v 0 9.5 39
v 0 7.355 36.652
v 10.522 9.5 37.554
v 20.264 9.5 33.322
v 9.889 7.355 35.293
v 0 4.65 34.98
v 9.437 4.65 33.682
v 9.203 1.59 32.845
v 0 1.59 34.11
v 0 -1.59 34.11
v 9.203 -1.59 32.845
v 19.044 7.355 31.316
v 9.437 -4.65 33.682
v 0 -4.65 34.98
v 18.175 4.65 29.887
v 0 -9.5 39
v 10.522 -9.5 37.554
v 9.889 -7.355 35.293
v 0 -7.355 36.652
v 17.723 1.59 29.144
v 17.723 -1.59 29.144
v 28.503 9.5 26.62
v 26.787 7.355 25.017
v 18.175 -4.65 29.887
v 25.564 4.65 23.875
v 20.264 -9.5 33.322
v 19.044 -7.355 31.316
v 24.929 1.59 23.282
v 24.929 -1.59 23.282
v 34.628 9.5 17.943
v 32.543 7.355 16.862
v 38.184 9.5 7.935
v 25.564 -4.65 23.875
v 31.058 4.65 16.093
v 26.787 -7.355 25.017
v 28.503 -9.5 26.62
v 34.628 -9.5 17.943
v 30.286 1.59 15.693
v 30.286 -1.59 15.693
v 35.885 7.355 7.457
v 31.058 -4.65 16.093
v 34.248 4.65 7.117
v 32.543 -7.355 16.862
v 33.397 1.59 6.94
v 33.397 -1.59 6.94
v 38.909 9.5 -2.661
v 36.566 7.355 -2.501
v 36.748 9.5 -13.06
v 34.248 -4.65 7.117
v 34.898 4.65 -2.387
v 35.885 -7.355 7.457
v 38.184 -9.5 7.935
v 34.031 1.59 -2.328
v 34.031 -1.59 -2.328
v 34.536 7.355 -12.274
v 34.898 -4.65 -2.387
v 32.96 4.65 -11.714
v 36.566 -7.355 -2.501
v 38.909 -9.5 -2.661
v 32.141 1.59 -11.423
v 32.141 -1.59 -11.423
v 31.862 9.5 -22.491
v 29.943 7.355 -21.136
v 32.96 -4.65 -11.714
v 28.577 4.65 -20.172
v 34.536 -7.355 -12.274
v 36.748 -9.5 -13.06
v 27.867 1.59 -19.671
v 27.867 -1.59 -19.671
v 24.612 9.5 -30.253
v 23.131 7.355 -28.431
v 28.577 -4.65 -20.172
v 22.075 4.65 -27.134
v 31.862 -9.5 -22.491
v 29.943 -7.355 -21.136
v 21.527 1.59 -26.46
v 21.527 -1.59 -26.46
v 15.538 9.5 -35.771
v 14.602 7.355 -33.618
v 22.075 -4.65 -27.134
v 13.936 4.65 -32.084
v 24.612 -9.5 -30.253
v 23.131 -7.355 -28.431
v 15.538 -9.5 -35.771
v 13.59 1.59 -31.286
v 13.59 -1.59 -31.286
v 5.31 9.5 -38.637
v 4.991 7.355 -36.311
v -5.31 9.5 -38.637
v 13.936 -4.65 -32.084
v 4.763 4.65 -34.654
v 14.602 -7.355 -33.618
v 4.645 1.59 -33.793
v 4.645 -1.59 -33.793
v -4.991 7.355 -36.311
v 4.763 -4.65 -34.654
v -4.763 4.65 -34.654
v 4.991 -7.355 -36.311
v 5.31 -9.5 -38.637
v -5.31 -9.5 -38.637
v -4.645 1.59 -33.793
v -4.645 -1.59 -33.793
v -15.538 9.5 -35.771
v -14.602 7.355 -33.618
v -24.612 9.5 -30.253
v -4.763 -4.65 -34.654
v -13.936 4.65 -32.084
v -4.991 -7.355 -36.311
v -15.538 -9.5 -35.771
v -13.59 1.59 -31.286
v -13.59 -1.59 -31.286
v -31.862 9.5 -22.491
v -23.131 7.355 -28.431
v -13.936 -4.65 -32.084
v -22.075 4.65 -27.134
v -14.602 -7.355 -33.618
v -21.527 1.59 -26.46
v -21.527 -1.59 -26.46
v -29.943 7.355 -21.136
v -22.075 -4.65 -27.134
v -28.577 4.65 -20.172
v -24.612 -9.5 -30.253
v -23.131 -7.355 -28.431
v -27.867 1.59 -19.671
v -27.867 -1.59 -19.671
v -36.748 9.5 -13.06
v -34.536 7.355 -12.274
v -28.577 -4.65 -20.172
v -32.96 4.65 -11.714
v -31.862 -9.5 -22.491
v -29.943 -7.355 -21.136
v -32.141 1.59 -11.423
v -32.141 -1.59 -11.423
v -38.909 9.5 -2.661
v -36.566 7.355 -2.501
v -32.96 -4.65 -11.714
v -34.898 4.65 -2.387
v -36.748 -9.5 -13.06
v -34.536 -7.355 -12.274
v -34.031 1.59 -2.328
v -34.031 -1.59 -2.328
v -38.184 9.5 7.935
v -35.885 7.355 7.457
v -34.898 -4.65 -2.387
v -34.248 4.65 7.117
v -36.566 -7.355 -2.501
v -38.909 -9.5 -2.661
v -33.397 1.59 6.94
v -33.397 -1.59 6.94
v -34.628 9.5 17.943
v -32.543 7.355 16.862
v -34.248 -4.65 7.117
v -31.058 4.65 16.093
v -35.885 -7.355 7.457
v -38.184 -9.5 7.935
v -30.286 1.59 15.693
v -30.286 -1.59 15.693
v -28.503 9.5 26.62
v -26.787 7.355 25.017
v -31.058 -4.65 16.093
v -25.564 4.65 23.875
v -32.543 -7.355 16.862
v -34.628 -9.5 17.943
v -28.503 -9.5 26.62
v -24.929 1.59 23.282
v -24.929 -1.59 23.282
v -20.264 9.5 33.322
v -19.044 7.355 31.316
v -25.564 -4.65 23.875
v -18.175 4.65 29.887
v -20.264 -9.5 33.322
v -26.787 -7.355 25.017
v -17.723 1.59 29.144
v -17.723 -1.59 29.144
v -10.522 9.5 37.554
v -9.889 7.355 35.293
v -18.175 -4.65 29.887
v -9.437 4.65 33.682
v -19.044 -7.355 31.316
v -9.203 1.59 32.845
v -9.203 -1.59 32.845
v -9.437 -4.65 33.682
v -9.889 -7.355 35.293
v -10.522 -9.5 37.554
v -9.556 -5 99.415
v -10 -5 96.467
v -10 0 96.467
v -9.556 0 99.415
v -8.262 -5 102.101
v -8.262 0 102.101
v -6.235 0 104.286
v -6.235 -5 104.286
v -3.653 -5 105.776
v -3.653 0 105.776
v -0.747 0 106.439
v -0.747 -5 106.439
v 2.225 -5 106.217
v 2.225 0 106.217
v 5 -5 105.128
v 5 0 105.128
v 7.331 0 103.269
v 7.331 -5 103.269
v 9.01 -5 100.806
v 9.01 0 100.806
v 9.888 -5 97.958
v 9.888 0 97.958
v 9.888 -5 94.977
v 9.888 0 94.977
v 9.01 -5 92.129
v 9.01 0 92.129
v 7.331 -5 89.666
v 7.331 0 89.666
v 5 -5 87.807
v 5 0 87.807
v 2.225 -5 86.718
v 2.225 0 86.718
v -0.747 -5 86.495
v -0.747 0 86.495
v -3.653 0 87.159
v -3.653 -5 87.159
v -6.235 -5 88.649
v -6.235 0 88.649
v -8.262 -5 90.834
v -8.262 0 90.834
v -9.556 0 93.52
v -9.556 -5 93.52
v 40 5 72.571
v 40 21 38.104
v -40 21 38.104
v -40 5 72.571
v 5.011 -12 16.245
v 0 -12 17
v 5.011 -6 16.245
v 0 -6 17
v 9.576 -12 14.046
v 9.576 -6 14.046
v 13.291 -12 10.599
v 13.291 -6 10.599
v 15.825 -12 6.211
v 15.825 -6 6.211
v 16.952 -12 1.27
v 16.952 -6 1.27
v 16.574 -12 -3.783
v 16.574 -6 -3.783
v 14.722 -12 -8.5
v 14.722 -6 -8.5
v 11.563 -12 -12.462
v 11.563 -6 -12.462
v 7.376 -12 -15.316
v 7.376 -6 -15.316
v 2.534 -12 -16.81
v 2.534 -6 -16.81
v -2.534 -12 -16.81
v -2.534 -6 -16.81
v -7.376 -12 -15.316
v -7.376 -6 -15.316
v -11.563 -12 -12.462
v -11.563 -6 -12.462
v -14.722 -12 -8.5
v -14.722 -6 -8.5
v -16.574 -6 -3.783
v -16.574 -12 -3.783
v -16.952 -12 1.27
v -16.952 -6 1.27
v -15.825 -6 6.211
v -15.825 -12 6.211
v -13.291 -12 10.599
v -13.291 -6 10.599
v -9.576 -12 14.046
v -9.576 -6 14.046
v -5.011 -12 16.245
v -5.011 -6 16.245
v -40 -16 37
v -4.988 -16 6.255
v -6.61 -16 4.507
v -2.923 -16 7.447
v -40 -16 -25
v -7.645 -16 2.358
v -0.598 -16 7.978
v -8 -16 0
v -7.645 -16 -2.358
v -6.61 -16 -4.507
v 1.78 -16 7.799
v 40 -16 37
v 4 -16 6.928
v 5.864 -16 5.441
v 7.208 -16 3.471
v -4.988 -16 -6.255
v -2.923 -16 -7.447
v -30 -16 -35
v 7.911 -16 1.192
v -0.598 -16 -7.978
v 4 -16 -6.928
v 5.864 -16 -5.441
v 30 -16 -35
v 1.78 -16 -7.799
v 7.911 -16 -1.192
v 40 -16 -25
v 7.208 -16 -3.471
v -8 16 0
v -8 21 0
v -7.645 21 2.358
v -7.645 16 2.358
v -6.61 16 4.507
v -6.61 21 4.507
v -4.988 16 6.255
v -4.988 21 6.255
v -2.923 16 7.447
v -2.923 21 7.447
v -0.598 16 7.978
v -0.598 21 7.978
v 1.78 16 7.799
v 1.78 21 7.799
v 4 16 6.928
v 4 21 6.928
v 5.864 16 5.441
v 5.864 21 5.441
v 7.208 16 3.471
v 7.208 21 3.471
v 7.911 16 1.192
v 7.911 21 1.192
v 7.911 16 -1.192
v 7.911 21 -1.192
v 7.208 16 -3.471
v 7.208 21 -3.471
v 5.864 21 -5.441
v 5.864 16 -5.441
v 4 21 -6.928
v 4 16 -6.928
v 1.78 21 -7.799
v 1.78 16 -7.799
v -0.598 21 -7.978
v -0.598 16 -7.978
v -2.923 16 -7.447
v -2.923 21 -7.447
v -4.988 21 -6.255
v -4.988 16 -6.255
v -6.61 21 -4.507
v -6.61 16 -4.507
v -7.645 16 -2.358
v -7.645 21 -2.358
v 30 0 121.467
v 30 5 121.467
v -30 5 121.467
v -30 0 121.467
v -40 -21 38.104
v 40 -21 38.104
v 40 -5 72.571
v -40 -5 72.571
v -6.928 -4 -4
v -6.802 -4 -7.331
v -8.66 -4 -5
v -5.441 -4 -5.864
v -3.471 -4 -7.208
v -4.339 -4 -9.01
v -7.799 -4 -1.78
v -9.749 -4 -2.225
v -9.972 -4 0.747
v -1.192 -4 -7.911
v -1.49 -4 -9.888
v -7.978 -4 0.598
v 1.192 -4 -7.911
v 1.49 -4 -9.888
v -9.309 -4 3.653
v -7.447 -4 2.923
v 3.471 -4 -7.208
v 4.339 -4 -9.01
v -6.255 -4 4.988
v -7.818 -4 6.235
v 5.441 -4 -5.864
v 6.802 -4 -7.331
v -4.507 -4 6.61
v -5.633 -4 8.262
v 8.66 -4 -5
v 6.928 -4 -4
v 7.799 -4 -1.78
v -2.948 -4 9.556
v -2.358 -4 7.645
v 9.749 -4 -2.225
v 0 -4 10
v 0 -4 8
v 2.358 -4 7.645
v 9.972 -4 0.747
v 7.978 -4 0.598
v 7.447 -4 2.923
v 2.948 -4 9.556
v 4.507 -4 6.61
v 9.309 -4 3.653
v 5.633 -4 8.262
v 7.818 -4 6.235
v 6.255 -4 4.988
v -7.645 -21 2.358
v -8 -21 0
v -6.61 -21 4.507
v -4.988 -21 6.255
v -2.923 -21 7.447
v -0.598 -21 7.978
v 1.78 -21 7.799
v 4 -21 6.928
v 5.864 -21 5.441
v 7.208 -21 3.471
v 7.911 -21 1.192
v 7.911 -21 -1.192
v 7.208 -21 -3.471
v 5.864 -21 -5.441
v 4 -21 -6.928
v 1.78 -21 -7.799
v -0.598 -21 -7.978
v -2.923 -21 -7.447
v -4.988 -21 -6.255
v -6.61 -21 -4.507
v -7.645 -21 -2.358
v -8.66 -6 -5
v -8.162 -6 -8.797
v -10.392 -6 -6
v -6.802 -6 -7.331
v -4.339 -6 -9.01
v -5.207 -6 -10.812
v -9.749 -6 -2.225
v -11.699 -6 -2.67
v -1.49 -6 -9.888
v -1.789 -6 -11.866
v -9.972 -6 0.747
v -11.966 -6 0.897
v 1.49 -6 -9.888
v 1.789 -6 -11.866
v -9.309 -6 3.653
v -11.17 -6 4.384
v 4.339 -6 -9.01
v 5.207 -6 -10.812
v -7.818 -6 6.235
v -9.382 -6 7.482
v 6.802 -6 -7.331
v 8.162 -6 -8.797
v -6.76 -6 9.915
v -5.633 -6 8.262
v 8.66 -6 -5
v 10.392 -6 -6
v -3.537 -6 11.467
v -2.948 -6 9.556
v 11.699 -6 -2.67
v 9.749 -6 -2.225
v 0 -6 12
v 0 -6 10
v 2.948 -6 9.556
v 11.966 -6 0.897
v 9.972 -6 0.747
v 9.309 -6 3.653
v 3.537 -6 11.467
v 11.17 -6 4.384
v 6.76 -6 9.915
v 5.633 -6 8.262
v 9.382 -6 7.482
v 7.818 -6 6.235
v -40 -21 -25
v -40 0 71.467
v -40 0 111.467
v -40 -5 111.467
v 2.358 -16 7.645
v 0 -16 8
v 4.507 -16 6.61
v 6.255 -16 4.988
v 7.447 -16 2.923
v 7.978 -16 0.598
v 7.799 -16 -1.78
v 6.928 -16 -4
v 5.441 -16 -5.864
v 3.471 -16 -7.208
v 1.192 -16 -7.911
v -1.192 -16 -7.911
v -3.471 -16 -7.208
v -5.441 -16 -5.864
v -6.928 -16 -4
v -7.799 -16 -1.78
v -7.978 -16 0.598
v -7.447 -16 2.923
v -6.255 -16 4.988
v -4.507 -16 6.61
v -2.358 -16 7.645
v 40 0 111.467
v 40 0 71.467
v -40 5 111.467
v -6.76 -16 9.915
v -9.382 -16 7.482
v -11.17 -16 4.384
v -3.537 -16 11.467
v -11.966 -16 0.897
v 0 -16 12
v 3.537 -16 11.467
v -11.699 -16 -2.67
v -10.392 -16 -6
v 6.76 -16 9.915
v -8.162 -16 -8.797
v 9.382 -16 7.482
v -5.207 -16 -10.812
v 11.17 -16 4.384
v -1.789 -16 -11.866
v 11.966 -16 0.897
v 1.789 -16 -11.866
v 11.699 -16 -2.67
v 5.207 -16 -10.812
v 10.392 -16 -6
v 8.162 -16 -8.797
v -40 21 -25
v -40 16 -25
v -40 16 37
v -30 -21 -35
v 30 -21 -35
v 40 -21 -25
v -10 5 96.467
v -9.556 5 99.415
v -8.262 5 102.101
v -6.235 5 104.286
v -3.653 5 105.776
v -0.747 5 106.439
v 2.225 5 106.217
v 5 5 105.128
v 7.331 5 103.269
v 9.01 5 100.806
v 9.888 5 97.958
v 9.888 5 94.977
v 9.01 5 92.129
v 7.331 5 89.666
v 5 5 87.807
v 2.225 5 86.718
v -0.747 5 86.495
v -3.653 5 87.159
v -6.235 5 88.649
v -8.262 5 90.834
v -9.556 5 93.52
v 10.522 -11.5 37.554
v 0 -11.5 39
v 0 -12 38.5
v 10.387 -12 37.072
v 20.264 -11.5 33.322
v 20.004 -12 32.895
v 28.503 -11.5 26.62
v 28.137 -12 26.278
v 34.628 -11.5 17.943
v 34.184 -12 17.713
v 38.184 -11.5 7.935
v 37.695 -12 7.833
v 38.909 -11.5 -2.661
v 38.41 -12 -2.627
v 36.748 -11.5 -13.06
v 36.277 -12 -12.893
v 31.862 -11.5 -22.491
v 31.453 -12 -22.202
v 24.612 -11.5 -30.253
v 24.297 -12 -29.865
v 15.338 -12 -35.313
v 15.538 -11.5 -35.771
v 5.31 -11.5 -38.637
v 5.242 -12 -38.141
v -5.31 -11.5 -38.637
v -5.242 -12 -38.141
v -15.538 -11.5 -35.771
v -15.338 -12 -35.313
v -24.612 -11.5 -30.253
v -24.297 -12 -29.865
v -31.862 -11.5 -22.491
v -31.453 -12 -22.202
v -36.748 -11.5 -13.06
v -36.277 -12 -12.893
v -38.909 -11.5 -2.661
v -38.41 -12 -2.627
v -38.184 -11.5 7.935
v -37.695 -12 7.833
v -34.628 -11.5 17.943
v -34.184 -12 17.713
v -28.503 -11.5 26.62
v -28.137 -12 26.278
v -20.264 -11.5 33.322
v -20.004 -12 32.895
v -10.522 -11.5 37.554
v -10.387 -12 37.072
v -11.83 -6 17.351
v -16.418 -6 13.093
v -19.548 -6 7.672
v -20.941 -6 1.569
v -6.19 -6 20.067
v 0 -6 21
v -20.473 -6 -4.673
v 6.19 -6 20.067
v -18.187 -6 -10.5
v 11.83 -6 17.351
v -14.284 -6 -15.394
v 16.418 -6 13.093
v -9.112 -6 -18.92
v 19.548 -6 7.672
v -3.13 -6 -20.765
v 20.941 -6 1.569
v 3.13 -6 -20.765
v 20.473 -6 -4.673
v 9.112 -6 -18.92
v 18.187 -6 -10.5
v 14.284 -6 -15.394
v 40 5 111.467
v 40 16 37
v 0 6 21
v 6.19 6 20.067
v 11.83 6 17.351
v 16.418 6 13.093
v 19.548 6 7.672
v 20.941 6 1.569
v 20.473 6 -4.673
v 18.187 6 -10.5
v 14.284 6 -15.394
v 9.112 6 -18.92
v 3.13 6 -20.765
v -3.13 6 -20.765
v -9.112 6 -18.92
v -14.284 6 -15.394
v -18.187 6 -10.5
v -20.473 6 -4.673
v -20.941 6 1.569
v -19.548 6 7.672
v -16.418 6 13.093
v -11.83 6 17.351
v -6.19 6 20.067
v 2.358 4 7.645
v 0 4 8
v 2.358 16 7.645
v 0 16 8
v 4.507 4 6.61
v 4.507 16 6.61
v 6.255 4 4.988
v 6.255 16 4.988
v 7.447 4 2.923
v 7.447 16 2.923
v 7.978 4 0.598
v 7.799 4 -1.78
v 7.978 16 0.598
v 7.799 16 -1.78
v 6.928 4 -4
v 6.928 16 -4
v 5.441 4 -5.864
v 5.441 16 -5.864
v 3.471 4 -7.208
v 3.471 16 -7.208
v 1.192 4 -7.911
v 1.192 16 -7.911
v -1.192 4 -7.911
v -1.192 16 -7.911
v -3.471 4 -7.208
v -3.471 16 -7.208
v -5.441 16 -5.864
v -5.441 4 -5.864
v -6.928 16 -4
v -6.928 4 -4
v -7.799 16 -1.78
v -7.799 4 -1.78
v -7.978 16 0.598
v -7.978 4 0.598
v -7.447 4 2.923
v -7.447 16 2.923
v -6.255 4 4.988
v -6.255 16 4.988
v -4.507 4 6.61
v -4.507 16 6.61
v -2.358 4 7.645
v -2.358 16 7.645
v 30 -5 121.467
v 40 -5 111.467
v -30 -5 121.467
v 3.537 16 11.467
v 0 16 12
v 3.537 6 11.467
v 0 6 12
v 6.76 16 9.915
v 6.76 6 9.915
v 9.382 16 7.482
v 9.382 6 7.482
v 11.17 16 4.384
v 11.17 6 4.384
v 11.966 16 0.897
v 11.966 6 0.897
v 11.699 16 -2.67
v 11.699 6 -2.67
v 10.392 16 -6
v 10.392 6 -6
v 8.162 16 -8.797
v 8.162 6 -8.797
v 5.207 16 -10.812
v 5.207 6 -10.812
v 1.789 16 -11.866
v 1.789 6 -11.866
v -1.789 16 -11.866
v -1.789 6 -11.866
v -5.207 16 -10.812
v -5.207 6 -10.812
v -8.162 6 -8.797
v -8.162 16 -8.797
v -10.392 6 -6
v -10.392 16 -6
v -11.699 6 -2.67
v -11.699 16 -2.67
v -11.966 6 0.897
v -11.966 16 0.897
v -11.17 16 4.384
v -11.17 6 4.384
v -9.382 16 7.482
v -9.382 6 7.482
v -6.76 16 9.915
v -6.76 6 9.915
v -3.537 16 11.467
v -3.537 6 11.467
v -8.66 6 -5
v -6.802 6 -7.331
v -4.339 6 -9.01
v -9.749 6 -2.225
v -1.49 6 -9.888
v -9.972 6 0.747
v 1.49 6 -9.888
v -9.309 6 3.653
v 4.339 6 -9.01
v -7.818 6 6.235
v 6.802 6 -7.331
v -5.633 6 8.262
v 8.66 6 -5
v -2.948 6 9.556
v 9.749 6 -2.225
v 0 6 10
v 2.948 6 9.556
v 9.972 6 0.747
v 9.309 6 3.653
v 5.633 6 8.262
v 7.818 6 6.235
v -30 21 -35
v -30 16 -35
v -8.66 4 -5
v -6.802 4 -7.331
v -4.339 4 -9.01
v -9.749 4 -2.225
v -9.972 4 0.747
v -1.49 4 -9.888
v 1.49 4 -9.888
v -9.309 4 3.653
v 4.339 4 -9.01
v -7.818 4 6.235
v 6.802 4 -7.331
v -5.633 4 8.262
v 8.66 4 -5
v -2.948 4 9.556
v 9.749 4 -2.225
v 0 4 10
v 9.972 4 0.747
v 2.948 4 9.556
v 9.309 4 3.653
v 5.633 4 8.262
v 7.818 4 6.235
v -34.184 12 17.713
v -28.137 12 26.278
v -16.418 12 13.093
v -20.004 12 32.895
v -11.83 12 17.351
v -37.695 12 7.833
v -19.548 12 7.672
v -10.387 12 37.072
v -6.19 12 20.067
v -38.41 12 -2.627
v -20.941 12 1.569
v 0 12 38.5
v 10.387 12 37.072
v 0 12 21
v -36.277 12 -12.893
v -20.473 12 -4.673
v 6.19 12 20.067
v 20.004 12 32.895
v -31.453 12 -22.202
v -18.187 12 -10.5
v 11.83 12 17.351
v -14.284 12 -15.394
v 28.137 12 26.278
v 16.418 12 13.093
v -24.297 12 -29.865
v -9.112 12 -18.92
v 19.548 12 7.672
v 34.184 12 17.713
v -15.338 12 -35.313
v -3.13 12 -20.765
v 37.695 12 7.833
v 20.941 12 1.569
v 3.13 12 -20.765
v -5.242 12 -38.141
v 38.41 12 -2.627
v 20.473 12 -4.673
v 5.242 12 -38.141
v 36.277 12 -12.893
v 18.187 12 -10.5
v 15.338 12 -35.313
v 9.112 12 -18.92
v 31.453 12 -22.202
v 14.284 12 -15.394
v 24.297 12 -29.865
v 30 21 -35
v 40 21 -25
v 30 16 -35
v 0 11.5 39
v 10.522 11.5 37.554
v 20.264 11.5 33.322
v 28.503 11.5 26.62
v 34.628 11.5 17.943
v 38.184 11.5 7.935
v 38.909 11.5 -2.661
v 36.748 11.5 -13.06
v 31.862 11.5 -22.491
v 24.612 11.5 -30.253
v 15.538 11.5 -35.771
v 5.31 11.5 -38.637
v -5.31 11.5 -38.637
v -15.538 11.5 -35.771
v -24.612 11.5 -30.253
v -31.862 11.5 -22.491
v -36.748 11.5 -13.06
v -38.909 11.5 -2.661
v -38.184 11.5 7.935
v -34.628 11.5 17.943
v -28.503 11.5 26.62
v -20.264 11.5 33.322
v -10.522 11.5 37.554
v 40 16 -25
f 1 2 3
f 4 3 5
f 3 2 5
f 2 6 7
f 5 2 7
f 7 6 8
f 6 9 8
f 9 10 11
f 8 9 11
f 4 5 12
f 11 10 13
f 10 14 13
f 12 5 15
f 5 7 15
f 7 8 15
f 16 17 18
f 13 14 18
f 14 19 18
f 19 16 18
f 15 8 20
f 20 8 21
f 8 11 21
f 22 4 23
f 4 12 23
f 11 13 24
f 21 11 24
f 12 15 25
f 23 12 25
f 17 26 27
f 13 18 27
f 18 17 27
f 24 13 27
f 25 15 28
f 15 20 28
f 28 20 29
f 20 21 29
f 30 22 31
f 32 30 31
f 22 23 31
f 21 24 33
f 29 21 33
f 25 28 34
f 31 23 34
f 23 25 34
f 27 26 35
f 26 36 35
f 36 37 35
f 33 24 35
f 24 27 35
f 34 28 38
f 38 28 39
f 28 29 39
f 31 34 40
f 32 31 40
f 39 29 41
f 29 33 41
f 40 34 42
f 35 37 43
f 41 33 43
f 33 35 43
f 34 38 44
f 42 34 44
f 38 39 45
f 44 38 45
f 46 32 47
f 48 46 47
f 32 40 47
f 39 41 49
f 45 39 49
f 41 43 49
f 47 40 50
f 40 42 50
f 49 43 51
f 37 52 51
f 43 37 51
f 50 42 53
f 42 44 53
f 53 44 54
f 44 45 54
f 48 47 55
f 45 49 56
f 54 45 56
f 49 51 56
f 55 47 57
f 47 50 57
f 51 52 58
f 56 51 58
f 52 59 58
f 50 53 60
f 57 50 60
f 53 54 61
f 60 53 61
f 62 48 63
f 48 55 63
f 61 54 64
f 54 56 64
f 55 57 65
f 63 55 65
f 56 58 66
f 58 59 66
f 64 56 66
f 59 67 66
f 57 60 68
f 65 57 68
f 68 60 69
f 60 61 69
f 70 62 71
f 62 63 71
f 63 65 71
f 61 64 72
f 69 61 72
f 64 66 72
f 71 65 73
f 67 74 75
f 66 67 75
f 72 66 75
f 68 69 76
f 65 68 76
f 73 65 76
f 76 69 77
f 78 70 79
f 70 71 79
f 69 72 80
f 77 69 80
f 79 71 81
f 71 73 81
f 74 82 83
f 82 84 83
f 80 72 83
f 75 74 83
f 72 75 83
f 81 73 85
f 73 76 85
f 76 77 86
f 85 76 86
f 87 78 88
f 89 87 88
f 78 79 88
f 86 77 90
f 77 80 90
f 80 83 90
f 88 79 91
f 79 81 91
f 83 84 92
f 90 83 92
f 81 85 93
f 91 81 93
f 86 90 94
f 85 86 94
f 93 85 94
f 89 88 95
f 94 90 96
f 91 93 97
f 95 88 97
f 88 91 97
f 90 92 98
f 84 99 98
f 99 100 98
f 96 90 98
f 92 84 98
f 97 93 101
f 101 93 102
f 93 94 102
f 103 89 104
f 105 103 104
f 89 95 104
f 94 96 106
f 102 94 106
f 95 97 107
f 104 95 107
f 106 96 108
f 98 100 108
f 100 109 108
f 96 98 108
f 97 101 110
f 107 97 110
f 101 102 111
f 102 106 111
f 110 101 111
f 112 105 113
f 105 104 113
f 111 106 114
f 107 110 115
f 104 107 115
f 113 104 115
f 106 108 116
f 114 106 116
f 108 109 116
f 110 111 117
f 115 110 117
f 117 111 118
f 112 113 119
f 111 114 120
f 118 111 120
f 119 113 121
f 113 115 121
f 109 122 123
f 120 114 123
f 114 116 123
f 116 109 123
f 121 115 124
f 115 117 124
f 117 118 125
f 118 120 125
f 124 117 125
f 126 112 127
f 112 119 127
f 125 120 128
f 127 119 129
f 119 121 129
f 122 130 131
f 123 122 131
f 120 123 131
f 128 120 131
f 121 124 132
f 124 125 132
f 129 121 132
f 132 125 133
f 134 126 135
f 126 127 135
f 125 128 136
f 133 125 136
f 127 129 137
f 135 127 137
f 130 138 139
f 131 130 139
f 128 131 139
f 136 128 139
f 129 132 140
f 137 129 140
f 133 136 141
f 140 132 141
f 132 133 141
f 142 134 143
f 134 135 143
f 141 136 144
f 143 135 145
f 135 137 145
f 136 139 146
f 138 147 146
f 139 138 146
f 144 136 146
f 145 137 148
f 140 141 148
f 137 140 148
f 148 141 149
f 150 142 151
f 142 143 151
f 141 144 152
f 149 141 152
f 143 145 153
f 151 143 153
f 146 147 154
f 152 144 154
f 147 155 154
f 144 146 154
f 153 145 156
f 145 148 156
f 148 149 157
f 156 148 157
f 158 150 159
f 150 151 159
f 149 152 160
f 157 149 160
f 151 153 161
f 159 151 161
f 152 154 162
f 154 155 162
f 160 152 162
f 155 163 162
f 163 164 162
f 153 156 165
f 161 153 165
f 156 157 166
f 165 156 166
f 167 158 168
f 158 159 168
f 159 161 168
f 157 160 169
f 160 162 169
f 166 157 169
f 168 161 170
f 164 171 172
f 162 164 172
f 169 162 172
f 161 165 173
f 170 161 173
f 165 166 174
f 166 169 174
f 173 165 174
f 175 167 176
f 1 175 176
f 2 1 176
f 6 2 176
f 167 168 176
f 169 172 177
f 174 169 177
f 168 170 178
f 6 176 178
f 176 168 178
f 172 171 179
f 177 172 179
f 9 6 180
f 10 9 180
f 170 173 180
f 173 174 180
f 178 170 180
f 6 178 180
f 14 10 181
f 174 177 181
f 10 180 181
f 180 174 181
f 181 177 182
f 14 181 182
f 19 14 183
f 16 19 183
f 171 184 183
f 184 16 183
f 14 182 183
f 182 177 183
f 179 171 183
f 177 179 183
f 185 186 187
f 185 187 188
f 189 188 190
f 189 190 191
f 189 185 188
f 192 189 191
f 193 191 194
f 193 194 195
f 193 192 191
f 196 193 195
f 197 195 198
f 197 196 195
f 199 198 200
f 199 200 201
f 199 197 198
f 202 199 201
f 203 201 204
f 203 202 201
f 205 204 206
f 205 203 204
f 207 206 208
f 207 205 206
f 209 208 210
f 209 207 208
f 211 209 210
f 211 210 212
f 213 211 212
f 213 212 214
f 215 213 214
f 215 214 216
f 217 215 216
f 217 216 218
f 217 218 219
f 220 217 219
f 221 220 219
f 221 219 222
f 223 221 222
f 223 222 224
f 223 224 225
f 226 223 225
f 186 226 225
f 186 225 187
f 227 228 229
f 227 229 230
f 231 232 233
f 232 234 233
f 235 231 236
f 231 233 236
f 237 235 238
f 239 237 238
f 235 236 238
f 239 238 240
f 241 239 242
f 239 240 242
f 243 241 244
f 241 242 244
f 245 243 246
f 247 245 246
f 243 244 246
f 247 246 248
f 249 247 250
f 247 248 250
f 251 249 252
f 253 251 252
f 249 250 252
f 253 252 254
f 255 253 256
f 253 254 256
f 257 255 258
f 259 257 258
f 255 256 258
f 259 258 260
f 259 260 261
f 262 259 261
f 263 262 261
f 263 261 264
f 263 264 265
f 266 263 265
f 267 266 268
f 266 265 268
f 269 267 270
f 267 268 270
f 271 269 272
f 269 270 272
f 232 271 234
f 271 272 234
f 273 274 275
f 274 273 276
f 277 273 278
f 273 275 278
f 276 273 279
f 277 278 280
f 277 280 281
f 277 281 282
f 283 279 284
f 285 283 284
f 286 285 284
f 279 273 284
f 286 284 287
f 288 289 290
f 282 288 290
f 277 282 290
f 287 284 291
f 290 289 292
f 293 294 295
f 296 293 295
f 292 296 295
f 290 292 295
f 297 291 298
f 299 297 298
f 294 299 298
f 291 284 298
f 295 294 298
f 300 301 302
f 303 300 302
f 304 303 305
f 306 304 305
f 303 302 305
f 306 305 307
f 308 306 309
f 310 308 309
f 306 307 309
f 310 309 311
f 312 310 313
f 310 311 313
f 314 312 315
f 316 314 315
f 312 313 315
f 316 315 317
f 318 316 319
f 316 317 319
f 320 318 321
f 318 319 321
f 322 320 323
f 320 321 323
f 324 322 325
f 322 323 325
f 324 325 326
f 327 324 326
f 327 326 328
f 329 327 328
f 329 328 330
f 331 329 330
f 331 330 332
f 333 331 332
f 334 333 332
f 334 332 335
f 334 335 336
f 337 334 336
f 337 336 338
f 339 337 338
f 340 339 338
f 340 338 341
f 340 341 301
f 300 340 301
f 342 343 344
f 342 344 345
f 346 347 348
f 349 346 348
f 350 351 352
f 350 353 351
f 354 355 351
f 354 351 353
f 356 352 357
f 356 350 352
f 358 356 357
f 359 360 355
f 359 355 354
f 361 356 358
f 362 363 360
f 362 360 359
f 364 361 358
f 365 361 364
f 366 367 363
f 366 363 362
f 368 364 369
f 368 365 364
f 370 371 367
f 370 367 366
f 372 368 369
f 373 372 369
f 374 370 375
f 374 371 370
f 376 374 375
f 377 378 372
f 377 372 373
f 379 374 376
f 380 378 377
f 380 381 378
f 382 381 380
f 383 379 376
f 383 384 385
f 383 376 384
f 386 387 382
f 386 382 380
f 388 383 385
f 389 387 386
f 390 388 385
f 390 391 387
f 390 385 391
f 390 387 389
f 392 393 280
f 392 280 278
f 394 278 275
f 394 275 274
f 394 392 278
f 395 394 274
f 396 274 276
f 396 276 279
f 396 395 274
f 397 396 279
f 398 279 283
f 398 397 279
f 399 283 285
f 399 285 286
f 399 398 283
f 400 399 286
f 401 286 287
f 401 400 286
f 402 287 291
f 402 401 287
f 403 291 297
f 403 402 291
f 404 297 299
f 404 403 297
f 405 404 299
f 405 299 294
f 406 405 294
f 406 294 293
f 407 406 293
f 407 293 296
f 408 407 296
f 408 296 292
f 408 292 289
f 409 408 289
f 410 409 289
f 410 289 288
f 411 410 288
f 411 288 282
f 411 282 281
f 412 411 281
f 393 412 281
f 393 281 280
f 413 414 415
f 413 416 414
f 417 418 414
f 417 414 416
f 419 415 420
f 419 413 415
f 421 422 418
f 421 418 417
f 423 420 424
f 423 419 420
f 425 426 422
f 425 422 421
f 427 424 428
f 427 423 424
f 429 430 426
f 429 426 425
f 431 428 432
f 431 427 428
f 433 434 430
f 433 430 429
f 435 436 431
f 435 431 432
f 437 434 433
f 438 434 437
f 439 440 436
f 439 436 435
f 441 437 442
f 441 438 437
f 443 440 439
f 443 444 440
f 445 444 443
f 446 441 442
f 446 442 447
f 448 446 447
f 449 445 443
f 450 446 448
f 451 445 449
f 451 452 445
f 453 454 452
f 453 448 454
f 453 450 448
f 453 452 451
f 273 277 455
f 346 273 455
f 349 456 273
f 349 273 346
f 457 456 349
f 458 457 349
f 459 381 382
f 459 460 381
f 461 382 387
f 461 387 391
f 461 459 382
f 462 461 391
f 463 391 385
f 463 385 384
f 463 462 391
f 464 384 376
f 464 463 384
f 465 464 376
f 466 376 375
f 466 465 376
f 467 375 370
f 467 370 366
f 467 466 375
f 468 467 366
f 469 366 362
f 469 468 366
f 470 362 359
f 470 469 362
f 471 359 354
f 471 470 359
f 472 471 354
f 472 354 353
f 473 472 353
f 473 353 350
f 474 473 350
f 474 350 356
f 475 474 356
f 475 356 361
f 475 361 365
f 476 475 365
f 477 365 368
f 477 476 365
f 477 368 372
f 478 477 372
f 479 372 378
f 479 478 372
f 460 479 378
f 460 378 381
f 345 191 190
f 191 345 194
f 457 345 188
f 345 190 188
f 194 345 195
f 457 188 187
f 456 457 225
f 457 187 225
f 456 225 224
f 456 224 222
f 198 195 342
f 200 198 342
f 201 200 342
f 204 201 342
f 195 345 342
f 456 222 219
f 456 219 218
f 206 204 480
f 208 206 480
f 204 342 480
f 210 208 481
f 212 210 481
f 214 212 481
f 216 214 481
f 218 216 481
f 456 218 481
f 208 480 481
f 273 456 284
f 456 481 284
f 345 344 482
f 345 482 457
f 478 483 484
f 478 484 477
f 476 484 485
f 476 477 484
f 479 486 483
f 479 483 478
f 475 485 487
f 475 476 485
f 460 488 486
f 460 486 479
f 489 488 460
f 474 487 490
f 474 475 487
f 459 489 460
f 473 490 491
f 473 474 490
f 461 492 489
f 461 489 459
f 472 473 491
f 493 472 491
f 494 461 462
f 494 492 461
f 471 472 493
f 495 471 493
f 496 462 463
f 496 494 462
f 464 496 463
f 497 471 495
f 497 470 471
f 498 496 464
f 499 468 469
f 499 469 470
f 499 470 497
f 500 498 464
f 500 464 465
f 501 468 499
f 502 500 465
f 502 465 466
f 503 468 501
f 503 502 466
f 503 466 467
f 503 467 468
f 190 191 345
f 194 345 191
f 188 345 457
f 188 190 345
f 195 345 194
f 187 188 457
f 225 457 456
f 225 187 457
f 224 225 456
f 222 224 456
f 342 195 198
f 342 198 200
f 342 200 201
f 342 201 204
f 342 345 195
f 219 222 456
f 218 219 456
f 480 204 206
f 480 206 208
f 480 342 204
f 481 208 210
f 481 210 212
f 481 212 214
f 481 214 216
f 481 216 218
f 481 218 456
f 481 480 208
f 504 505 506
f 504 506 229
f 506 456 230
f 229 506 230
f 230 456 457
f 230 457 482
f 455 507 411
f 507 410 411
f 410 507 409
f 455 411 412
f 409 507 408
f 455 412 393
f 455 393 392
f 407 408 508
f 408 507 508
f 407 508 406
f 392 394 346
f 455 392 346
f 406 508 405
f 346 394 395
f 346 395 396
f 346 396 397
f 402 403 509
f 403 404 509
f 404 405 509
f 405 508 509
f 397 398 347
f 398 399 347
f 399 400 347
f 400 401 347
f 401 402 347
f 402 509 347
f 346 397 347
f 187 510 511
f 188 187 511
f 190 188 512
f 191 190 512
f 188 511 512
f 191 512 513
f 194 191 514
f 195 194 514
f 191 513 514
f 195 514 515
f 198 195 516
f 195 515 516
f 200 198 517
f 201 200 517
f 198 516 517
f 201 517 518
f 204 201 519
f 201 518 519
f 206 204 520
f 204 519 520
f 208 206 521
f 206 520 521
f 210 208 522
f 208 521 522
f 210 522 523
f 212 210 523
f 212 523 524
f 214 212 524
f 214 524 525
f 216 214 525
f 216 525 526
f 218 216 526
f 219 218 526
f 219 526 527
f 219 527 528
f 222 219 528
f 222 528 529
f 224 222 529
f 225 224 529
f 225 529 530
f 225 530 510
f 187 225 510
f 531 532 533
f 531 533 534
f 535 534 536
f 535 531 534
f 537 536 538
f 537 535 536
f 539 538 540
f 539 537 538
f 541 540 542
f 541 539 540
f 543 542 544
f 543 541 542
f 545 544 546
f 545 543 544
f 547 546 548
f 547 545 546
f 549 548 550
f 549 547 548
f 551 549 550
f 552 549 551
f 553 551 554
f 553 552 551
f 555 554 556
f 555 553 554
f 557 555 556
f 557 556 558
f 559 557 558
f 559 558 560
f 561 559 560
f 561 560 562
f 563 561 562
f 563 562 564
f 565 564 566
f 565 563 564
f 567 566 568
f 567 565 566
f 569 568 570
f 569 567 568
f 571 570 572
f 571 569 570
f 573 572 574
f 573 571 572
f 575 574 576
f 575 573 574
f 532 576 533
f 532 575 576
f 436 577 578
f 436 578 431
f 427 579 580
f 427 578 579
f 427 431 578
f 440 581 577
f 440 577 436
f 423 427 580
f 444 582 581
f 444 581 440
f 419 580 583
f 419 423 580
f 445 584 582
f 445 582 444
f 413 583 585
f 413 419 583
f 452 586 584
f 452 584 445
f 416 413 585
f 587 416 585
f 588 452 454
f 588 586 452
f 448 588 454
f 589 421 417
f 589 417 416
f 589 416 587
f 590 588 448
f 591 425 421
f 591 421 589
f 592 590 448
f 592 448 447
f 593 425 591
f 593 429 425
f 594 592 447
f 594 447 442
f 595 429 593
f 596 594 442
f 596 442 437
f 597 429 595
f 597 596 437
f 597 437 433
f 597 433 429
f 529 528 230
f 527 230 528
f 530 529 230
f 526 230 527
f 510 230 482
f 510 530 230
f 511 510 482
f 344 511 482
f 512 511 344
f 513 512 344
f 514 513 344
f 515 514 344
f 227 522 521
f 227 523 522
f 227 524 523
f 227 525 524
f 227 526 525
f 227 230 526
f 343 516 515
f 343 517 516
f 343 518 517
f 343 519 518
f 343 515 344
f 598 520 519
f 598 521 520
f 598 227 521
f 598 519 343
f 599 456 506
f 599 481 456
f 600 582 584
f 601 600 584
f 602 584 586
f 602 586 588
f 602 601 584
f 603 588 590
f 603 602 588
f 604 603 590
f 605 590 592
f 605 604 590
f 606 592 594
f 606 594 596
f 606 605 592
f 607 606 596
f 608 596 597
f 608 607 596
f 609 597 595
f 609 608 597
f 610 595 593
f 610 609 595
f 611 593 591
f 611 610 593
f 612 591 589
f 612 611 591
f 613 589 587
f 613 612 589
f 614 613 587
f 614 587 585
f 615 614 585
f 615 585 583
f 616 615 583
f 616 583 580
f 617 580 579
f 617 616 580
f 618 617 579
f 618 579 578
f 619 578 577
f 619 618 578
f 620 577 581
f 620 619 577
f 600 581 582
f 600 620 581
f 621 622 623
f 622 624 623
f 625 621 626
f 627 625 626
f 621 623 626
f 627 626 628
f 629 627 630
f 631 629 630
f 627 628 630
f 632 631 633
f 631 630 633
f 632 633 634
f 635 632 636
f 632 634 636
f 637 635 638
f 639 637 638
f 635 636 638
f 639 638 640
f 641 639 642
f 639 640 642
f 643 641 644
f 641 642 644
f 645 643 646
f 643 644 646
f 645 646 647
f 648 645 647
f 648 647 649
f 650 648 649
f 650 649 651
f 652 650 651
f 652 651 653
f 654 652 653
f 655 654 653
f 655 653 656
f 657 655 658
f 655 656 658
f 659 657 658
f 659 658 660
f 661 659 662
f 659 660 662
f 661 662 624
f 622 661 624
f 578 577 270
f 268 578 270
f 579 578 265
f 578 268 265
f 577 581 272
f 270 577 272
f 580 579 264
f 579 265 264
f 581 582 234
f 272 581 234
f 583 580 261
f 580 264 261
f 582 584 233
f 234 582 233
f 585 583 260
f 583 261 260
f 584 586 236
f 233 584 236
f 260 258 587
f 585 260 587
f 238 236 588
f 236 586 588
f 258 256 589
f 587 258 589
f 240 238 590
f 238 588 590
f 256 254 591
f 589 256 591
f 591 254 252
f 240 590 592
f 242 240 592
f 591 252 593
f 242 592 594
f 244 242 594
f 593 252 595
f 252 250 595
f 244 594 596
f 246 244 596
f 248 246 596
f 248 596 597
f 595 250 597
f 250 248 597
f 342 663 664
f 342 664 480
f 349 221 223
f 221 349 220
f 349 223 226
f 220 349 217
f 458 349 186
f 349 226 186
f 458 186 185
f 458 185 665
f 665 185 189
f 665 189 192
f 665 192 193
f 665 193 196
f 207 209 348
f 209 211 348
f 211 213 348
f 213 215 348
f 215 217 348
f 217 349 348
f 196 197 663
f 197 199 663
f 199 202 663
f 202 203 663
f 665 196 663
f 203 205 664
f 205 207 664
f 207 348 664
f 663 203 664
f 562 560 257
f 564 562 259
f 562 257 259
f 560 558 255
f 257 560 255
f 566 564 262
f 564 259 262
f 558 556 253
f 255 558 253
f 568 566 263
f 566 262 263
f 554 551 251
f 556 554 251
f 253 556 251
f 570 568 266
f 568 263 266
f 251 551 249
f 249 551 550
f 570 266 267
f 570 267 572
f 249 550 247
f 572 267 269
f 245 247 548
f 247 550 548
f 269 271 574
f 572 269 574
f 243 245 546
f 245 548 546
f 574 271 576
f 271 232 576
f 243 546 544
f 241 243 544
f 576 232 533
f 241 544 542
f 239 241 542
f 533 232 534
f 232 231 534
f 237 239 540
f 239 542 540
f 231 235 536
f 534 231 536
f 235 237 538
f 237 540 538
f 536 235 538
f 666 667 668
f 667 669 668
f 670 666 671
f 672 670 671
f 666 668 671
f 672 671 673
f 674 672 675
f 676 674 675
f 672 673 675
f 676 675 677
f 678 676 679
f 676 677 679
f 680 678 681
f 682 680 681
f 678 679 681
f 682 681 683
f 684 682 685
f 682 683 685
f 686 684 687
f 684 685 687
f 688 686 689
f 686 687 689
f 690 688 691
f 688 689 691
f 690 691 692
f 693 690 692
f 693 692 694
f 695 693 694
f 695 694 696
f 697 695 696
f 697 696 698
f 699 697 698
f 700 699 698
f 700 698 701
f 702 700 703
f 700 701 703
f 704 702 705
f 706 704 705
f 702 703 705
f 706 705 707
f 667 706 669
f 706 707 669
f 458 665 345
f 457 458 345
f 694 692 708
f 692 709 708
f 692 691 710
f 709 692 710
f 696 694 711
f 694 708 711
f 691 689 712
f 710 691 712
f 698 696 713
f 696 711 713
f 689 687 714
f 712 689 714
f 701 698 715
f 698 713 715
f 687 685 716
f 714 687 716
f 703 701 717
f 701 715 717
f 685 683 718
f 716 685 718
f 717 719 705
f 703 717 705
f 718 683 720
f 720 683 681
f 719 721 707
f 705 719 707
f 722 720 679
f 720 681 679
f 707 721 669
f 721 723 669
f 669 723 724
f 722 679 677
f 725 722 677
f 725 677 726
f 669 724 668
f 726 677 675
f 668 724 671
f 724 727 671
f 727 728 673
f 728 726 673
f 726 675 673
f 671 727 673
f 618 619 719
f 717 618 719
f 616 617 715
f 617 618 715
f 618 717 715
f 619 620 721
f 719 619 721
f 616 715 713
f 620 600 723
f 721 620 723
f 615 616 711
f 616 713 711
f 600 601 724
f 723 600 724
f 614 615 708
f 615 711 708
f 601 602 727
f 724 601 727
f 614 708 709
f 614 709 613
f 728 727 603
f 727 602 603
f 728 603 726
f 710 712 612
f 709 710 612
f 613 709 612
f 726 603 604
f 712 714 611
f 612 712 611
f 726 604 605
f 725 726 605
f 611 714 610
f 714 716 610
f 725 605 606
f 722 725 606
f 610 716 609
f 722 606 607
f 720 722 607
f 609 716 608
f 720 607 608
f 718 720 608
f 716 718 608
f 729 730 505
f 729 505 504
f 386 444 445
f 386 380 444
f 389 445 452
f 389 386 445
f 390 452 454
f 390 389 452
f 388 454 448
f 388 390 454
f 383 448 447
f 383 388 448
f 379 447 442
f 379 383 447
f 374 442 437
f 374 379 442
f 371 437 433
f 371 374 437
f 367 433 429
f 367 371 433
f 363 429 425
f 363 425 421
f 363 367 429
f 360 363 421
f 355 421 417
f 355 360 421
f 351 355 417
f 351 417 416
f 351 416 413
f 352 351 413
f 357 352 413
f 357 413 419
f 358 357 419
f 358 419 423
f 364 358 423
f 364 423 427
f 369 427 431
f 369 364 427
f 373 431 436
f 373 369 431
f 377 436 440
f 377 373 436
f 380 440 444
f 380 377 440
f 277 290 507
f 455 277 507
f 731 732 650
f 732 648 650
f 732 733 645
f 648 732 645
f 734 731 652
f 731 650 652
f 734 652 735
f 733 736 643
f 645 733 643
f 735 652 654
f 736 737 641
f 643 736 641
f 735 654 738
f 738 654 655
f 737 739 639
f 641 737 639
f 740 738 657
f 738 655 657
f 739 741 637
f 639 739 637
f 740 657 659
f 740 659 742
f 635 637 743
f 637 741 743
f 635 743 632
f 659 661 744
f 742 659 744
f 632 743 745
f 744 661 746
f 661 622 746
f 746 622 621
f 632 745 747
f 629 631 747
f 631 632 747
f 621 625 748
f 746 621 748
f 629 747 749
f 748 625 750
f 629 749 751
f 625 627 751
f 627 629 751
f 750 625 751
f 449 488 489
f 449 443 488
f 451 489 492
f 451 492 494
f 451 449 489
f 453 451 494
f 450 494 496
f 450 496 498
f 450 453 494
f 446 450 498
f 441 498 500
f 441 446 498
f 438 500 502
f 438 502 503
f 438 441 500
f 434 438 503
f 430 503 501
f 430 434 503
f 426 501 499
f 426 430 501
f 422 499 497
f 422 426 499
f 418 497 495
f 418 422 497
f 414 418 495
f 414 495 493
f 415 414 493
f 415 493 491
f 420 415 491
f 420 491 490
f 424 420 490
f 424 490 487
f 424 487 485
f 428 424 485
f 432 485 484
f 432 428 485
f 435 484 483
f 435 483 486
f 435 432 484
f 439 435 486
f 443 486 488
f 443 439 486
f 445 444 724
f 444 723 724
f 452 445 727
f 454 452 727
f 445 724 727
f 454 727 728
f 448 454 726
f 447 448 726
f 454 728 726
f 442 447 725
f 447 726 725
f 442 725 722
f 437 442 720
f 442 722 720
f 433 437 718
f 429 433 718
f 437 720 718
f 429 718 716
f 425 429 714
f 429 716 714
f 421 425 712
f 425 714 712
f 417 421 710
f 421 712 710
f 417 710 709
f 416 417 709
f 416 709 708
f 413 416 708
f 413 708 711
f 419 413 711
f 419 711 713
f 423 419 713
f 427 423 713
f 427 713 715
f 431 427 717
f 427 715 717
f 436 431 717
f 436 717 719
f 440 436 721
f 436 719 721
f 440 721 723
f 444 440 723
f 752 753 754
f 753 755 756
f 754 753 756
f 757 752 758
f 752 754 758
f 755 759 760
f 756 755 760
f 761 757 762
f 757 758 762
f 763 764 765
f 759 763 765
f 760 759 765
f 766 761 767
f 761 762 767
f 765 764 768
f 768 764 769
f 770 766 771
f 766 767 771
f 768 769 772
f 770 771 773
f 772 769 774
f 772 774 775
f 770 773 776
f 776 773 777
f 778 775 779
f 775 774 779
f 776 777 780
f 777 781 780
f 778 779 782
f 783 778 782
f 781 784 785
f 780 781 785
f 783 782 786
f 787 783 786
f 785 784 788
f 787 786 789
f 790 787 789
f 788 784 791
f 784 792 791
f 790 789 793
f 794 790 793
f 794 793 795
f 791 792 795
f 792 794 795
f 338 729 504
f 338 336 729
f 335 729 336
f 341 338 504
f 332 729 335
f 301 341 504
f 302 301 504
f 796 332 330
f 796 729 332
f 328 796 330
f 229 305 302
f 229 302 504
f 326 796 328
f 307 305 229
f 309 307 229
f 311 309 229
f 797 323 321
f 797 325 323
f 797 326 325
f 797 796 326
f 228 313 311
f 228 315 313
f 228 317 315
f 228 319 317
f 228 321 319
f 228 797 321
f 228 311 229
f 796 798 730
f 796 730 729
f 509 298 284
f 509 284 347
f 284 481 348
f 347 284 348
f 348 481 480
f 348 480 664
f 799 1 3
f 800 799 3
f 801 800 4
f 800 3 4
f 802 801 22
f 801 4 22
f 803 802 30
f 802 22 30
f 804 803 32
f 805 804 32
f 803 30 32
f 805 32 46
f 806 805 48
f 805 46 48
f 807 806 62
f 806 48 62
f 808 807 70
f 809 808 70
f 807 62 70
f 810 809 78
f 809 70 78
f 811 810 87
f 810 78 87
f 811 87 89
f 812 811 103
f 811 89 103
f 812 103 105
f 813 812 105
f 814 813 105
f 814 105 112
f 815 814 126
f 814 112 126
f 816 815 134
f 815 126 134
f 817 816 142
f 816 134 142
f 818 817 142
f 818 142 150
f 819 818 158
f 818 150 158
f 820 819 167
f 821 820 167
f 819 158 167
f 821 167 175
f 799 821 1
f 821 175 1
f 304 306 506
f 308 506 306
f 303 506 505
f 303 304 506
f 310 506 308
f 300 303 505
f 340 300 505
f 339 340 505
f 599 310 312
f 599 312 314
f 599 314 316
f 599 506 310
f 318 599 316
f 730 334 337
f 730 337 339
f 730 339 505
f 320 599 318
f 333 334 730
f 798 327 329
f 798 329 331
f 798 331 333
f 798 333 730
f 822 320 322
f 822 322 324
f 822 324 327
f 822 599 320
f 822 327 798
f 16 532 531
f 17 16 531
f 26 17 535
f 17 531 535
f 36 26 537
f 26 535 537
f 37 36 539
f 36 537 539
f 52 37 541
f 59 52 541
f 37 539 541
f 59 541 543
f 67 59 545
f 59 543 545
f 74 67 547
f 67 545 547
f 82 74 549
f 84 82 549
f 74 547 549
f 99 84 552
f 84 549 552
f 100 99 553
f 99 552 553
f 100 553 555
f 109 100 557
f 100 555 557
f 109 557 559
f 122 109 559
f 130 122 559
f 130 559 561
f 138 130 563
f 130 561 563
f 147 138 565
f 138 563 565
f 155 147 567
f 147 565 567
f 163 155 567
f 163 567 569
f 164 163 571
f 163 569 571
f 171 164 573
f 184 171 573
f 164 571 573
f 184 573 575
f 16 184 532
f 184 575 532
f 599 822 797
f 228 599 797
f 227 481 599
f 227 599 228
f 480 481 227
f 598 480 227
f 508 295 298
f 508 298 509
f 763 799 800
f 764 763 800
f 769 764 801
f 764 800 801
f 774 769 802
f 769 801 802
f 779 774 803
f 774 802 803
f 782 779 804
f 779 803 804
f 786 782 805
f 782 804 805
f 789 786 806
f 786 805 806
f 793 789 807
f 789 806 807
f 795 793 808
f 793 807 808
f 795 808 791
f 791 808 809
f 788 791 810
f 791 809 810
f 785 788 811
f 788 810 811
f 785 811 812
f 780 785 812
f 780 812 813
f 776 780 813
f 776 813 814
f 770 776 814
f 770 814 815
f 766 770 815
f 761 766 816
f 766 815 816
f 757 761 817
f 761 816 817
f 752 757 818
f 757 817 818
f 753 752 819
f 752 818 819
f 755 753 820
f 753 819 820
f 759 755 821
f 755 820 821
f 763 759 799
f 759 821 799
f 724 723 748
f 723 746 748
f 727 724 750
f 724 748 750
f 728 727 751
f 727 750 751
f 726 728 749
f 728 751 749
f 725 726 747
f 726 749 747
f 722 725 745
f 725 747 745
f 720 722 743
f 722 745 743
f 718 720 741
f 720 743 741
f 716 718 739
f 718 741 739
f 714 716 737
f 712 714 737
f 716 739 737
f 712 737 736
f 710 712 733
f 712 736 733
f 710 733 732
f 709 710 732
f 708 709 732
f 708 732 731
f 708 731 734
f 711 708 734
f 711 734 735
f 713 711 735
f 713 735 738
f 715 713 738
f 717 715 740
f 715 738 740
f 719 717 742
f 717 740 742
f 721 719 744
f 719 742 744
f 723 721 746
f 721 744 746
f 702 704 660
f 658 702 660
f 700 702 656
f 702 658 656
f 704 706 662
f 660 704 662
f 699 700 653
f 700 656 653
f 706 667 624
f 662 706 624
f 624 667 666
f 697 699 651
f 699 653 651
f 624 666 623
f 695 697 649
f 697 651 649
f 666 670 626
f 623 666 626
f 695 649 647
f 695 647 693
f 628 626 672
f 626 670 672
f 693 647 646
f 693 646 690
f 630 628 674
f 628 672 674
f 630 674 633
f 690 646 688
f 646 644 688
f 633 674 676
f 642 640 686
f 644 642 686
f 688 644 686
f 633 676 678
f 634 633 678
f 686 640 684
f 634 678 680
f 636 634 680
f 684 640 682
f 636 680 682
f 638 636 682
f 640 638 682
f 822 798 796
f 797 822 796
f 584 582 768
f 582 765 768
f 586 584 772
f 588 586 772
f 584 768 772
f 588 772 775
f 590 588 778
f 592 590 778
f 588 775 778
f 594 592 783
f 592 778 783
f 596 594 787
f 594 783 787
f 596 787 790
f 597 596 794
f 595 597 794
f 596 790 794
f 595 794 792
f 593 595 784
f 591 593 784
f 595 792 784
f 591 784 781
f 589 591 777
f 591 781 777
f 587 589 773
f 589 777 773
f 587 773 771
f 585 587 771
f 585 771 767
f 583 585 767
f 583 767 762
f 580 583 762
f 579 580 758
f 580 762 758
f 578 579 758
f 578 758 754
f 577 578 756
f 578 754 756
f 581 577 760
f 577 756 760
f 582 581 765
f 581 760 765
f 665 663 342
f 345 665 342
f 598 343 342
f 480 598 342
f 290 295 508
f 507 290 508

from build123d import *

# Parameters (mm, degrees)
F2_SIZE   = 0.5
F3_W      = 12
F3_H      = 11
F9_DEPTH  = 40
F10_R     = 8
F10_R_2   = 10
F11_DEPTH = 37.001
F12_SIZE  = 10


with BuildPart() as f1:
    # F0 (on Right) → F1 (revolve)
    with BuildSketch(Plane.YZ):
        with BuildLine():
            Line((-12, 39), (-12, 17))
            Line((-12, 17), (-6, 17))
            Line((-6, 17), (-6, 21))
            Line((-6, 21), (12, 21))
            Line((12, 21), (12, 39))
            Line((12, 39), (9.5, 39))
            ThreePointArc((9.5, 39), (0, 34), (-9.5, 39))
            Line((-9.5, 39), (-12, 39))
        make_face()
    revolve(axis=Axis((0, -0.299999, 0), (0, 1, 0)))

    # F2
    f2_edges = [f1.edges().sort_by_distance(p)[0] for p in [
        (0, 12, -39),
        (0, -12, -39),
    ]]
    chamfer(f2_edges, length=F2_SIZE)


with BuildPart() as f4:
    # F3 (on Right) → F4 (revolve)
    with BuildSketch(Plane.YZ):
        with Locations((0, 15.5)):
            Rectangle(F3_W, F3_H)
    revolve(axis=Axis((0, -1.944625, 0), (0, 1, 0)))


with BuildPart() as f6:
    # F5 (on Right) → F6 (revolve)
    with BuildSketch(Plane.YZ):
        Polygon((6, 10), (4, 10), (4, 8), (16, 8), (16, 12), (6, 12), align=None)
    revolve(axis=Axis((0, -0.394324, 0), (0, 1, 0)))


with BuildPart() as f7_1:
    # F7: instance of F6
    add(f6.part.mirror(Plane.XZ))


with BuildPart() as f9:
    # F8 (on Right) → F9 (new body, symmetric)
    with BuildSketch(Plane.YZ):
        Polygon((0, 71.467376), (16, 37), (16, -35), (21, -35), (21, 38.103945), (5, 72.571321), (5, 121.467376), (0, 121.467376), align=None)
    extrude(amount=F9_DEPTH, both=True)

    # F10 (on face) → F11 (cut, through all)
    with BuildSketch(Plane(origin=(0, 21, 0), x_dir=(-1, 0, 0), z_dir=(0, 1, 0))):
        Circle(F10_R)
        with Locations((0, 96.467376)):
            Circle(F10_R_2)
    extrude(amount=-F11_DEPTH, mode=Mode.SUBTRACT)

    # F12
    f12_edges = [f9.edges().sort_by_distance(p)[0] for p in [
        (40, 2.5, 121.467376),
        (-40, 2.5, 121.467376),
        (40, 18.5, -35),
        (-40, 18.5, -35),
    ]]
    chamfer(f12_edges, length=F12_SIZE)


with BuildPart() as f13_1:
    # F13: instance of F9
    add(f9.part.mirror(Plane.XZ))


solid = Compound([f1.part, f4.part, f6.part, f7_1.part, f9.part, f13_1.part])
